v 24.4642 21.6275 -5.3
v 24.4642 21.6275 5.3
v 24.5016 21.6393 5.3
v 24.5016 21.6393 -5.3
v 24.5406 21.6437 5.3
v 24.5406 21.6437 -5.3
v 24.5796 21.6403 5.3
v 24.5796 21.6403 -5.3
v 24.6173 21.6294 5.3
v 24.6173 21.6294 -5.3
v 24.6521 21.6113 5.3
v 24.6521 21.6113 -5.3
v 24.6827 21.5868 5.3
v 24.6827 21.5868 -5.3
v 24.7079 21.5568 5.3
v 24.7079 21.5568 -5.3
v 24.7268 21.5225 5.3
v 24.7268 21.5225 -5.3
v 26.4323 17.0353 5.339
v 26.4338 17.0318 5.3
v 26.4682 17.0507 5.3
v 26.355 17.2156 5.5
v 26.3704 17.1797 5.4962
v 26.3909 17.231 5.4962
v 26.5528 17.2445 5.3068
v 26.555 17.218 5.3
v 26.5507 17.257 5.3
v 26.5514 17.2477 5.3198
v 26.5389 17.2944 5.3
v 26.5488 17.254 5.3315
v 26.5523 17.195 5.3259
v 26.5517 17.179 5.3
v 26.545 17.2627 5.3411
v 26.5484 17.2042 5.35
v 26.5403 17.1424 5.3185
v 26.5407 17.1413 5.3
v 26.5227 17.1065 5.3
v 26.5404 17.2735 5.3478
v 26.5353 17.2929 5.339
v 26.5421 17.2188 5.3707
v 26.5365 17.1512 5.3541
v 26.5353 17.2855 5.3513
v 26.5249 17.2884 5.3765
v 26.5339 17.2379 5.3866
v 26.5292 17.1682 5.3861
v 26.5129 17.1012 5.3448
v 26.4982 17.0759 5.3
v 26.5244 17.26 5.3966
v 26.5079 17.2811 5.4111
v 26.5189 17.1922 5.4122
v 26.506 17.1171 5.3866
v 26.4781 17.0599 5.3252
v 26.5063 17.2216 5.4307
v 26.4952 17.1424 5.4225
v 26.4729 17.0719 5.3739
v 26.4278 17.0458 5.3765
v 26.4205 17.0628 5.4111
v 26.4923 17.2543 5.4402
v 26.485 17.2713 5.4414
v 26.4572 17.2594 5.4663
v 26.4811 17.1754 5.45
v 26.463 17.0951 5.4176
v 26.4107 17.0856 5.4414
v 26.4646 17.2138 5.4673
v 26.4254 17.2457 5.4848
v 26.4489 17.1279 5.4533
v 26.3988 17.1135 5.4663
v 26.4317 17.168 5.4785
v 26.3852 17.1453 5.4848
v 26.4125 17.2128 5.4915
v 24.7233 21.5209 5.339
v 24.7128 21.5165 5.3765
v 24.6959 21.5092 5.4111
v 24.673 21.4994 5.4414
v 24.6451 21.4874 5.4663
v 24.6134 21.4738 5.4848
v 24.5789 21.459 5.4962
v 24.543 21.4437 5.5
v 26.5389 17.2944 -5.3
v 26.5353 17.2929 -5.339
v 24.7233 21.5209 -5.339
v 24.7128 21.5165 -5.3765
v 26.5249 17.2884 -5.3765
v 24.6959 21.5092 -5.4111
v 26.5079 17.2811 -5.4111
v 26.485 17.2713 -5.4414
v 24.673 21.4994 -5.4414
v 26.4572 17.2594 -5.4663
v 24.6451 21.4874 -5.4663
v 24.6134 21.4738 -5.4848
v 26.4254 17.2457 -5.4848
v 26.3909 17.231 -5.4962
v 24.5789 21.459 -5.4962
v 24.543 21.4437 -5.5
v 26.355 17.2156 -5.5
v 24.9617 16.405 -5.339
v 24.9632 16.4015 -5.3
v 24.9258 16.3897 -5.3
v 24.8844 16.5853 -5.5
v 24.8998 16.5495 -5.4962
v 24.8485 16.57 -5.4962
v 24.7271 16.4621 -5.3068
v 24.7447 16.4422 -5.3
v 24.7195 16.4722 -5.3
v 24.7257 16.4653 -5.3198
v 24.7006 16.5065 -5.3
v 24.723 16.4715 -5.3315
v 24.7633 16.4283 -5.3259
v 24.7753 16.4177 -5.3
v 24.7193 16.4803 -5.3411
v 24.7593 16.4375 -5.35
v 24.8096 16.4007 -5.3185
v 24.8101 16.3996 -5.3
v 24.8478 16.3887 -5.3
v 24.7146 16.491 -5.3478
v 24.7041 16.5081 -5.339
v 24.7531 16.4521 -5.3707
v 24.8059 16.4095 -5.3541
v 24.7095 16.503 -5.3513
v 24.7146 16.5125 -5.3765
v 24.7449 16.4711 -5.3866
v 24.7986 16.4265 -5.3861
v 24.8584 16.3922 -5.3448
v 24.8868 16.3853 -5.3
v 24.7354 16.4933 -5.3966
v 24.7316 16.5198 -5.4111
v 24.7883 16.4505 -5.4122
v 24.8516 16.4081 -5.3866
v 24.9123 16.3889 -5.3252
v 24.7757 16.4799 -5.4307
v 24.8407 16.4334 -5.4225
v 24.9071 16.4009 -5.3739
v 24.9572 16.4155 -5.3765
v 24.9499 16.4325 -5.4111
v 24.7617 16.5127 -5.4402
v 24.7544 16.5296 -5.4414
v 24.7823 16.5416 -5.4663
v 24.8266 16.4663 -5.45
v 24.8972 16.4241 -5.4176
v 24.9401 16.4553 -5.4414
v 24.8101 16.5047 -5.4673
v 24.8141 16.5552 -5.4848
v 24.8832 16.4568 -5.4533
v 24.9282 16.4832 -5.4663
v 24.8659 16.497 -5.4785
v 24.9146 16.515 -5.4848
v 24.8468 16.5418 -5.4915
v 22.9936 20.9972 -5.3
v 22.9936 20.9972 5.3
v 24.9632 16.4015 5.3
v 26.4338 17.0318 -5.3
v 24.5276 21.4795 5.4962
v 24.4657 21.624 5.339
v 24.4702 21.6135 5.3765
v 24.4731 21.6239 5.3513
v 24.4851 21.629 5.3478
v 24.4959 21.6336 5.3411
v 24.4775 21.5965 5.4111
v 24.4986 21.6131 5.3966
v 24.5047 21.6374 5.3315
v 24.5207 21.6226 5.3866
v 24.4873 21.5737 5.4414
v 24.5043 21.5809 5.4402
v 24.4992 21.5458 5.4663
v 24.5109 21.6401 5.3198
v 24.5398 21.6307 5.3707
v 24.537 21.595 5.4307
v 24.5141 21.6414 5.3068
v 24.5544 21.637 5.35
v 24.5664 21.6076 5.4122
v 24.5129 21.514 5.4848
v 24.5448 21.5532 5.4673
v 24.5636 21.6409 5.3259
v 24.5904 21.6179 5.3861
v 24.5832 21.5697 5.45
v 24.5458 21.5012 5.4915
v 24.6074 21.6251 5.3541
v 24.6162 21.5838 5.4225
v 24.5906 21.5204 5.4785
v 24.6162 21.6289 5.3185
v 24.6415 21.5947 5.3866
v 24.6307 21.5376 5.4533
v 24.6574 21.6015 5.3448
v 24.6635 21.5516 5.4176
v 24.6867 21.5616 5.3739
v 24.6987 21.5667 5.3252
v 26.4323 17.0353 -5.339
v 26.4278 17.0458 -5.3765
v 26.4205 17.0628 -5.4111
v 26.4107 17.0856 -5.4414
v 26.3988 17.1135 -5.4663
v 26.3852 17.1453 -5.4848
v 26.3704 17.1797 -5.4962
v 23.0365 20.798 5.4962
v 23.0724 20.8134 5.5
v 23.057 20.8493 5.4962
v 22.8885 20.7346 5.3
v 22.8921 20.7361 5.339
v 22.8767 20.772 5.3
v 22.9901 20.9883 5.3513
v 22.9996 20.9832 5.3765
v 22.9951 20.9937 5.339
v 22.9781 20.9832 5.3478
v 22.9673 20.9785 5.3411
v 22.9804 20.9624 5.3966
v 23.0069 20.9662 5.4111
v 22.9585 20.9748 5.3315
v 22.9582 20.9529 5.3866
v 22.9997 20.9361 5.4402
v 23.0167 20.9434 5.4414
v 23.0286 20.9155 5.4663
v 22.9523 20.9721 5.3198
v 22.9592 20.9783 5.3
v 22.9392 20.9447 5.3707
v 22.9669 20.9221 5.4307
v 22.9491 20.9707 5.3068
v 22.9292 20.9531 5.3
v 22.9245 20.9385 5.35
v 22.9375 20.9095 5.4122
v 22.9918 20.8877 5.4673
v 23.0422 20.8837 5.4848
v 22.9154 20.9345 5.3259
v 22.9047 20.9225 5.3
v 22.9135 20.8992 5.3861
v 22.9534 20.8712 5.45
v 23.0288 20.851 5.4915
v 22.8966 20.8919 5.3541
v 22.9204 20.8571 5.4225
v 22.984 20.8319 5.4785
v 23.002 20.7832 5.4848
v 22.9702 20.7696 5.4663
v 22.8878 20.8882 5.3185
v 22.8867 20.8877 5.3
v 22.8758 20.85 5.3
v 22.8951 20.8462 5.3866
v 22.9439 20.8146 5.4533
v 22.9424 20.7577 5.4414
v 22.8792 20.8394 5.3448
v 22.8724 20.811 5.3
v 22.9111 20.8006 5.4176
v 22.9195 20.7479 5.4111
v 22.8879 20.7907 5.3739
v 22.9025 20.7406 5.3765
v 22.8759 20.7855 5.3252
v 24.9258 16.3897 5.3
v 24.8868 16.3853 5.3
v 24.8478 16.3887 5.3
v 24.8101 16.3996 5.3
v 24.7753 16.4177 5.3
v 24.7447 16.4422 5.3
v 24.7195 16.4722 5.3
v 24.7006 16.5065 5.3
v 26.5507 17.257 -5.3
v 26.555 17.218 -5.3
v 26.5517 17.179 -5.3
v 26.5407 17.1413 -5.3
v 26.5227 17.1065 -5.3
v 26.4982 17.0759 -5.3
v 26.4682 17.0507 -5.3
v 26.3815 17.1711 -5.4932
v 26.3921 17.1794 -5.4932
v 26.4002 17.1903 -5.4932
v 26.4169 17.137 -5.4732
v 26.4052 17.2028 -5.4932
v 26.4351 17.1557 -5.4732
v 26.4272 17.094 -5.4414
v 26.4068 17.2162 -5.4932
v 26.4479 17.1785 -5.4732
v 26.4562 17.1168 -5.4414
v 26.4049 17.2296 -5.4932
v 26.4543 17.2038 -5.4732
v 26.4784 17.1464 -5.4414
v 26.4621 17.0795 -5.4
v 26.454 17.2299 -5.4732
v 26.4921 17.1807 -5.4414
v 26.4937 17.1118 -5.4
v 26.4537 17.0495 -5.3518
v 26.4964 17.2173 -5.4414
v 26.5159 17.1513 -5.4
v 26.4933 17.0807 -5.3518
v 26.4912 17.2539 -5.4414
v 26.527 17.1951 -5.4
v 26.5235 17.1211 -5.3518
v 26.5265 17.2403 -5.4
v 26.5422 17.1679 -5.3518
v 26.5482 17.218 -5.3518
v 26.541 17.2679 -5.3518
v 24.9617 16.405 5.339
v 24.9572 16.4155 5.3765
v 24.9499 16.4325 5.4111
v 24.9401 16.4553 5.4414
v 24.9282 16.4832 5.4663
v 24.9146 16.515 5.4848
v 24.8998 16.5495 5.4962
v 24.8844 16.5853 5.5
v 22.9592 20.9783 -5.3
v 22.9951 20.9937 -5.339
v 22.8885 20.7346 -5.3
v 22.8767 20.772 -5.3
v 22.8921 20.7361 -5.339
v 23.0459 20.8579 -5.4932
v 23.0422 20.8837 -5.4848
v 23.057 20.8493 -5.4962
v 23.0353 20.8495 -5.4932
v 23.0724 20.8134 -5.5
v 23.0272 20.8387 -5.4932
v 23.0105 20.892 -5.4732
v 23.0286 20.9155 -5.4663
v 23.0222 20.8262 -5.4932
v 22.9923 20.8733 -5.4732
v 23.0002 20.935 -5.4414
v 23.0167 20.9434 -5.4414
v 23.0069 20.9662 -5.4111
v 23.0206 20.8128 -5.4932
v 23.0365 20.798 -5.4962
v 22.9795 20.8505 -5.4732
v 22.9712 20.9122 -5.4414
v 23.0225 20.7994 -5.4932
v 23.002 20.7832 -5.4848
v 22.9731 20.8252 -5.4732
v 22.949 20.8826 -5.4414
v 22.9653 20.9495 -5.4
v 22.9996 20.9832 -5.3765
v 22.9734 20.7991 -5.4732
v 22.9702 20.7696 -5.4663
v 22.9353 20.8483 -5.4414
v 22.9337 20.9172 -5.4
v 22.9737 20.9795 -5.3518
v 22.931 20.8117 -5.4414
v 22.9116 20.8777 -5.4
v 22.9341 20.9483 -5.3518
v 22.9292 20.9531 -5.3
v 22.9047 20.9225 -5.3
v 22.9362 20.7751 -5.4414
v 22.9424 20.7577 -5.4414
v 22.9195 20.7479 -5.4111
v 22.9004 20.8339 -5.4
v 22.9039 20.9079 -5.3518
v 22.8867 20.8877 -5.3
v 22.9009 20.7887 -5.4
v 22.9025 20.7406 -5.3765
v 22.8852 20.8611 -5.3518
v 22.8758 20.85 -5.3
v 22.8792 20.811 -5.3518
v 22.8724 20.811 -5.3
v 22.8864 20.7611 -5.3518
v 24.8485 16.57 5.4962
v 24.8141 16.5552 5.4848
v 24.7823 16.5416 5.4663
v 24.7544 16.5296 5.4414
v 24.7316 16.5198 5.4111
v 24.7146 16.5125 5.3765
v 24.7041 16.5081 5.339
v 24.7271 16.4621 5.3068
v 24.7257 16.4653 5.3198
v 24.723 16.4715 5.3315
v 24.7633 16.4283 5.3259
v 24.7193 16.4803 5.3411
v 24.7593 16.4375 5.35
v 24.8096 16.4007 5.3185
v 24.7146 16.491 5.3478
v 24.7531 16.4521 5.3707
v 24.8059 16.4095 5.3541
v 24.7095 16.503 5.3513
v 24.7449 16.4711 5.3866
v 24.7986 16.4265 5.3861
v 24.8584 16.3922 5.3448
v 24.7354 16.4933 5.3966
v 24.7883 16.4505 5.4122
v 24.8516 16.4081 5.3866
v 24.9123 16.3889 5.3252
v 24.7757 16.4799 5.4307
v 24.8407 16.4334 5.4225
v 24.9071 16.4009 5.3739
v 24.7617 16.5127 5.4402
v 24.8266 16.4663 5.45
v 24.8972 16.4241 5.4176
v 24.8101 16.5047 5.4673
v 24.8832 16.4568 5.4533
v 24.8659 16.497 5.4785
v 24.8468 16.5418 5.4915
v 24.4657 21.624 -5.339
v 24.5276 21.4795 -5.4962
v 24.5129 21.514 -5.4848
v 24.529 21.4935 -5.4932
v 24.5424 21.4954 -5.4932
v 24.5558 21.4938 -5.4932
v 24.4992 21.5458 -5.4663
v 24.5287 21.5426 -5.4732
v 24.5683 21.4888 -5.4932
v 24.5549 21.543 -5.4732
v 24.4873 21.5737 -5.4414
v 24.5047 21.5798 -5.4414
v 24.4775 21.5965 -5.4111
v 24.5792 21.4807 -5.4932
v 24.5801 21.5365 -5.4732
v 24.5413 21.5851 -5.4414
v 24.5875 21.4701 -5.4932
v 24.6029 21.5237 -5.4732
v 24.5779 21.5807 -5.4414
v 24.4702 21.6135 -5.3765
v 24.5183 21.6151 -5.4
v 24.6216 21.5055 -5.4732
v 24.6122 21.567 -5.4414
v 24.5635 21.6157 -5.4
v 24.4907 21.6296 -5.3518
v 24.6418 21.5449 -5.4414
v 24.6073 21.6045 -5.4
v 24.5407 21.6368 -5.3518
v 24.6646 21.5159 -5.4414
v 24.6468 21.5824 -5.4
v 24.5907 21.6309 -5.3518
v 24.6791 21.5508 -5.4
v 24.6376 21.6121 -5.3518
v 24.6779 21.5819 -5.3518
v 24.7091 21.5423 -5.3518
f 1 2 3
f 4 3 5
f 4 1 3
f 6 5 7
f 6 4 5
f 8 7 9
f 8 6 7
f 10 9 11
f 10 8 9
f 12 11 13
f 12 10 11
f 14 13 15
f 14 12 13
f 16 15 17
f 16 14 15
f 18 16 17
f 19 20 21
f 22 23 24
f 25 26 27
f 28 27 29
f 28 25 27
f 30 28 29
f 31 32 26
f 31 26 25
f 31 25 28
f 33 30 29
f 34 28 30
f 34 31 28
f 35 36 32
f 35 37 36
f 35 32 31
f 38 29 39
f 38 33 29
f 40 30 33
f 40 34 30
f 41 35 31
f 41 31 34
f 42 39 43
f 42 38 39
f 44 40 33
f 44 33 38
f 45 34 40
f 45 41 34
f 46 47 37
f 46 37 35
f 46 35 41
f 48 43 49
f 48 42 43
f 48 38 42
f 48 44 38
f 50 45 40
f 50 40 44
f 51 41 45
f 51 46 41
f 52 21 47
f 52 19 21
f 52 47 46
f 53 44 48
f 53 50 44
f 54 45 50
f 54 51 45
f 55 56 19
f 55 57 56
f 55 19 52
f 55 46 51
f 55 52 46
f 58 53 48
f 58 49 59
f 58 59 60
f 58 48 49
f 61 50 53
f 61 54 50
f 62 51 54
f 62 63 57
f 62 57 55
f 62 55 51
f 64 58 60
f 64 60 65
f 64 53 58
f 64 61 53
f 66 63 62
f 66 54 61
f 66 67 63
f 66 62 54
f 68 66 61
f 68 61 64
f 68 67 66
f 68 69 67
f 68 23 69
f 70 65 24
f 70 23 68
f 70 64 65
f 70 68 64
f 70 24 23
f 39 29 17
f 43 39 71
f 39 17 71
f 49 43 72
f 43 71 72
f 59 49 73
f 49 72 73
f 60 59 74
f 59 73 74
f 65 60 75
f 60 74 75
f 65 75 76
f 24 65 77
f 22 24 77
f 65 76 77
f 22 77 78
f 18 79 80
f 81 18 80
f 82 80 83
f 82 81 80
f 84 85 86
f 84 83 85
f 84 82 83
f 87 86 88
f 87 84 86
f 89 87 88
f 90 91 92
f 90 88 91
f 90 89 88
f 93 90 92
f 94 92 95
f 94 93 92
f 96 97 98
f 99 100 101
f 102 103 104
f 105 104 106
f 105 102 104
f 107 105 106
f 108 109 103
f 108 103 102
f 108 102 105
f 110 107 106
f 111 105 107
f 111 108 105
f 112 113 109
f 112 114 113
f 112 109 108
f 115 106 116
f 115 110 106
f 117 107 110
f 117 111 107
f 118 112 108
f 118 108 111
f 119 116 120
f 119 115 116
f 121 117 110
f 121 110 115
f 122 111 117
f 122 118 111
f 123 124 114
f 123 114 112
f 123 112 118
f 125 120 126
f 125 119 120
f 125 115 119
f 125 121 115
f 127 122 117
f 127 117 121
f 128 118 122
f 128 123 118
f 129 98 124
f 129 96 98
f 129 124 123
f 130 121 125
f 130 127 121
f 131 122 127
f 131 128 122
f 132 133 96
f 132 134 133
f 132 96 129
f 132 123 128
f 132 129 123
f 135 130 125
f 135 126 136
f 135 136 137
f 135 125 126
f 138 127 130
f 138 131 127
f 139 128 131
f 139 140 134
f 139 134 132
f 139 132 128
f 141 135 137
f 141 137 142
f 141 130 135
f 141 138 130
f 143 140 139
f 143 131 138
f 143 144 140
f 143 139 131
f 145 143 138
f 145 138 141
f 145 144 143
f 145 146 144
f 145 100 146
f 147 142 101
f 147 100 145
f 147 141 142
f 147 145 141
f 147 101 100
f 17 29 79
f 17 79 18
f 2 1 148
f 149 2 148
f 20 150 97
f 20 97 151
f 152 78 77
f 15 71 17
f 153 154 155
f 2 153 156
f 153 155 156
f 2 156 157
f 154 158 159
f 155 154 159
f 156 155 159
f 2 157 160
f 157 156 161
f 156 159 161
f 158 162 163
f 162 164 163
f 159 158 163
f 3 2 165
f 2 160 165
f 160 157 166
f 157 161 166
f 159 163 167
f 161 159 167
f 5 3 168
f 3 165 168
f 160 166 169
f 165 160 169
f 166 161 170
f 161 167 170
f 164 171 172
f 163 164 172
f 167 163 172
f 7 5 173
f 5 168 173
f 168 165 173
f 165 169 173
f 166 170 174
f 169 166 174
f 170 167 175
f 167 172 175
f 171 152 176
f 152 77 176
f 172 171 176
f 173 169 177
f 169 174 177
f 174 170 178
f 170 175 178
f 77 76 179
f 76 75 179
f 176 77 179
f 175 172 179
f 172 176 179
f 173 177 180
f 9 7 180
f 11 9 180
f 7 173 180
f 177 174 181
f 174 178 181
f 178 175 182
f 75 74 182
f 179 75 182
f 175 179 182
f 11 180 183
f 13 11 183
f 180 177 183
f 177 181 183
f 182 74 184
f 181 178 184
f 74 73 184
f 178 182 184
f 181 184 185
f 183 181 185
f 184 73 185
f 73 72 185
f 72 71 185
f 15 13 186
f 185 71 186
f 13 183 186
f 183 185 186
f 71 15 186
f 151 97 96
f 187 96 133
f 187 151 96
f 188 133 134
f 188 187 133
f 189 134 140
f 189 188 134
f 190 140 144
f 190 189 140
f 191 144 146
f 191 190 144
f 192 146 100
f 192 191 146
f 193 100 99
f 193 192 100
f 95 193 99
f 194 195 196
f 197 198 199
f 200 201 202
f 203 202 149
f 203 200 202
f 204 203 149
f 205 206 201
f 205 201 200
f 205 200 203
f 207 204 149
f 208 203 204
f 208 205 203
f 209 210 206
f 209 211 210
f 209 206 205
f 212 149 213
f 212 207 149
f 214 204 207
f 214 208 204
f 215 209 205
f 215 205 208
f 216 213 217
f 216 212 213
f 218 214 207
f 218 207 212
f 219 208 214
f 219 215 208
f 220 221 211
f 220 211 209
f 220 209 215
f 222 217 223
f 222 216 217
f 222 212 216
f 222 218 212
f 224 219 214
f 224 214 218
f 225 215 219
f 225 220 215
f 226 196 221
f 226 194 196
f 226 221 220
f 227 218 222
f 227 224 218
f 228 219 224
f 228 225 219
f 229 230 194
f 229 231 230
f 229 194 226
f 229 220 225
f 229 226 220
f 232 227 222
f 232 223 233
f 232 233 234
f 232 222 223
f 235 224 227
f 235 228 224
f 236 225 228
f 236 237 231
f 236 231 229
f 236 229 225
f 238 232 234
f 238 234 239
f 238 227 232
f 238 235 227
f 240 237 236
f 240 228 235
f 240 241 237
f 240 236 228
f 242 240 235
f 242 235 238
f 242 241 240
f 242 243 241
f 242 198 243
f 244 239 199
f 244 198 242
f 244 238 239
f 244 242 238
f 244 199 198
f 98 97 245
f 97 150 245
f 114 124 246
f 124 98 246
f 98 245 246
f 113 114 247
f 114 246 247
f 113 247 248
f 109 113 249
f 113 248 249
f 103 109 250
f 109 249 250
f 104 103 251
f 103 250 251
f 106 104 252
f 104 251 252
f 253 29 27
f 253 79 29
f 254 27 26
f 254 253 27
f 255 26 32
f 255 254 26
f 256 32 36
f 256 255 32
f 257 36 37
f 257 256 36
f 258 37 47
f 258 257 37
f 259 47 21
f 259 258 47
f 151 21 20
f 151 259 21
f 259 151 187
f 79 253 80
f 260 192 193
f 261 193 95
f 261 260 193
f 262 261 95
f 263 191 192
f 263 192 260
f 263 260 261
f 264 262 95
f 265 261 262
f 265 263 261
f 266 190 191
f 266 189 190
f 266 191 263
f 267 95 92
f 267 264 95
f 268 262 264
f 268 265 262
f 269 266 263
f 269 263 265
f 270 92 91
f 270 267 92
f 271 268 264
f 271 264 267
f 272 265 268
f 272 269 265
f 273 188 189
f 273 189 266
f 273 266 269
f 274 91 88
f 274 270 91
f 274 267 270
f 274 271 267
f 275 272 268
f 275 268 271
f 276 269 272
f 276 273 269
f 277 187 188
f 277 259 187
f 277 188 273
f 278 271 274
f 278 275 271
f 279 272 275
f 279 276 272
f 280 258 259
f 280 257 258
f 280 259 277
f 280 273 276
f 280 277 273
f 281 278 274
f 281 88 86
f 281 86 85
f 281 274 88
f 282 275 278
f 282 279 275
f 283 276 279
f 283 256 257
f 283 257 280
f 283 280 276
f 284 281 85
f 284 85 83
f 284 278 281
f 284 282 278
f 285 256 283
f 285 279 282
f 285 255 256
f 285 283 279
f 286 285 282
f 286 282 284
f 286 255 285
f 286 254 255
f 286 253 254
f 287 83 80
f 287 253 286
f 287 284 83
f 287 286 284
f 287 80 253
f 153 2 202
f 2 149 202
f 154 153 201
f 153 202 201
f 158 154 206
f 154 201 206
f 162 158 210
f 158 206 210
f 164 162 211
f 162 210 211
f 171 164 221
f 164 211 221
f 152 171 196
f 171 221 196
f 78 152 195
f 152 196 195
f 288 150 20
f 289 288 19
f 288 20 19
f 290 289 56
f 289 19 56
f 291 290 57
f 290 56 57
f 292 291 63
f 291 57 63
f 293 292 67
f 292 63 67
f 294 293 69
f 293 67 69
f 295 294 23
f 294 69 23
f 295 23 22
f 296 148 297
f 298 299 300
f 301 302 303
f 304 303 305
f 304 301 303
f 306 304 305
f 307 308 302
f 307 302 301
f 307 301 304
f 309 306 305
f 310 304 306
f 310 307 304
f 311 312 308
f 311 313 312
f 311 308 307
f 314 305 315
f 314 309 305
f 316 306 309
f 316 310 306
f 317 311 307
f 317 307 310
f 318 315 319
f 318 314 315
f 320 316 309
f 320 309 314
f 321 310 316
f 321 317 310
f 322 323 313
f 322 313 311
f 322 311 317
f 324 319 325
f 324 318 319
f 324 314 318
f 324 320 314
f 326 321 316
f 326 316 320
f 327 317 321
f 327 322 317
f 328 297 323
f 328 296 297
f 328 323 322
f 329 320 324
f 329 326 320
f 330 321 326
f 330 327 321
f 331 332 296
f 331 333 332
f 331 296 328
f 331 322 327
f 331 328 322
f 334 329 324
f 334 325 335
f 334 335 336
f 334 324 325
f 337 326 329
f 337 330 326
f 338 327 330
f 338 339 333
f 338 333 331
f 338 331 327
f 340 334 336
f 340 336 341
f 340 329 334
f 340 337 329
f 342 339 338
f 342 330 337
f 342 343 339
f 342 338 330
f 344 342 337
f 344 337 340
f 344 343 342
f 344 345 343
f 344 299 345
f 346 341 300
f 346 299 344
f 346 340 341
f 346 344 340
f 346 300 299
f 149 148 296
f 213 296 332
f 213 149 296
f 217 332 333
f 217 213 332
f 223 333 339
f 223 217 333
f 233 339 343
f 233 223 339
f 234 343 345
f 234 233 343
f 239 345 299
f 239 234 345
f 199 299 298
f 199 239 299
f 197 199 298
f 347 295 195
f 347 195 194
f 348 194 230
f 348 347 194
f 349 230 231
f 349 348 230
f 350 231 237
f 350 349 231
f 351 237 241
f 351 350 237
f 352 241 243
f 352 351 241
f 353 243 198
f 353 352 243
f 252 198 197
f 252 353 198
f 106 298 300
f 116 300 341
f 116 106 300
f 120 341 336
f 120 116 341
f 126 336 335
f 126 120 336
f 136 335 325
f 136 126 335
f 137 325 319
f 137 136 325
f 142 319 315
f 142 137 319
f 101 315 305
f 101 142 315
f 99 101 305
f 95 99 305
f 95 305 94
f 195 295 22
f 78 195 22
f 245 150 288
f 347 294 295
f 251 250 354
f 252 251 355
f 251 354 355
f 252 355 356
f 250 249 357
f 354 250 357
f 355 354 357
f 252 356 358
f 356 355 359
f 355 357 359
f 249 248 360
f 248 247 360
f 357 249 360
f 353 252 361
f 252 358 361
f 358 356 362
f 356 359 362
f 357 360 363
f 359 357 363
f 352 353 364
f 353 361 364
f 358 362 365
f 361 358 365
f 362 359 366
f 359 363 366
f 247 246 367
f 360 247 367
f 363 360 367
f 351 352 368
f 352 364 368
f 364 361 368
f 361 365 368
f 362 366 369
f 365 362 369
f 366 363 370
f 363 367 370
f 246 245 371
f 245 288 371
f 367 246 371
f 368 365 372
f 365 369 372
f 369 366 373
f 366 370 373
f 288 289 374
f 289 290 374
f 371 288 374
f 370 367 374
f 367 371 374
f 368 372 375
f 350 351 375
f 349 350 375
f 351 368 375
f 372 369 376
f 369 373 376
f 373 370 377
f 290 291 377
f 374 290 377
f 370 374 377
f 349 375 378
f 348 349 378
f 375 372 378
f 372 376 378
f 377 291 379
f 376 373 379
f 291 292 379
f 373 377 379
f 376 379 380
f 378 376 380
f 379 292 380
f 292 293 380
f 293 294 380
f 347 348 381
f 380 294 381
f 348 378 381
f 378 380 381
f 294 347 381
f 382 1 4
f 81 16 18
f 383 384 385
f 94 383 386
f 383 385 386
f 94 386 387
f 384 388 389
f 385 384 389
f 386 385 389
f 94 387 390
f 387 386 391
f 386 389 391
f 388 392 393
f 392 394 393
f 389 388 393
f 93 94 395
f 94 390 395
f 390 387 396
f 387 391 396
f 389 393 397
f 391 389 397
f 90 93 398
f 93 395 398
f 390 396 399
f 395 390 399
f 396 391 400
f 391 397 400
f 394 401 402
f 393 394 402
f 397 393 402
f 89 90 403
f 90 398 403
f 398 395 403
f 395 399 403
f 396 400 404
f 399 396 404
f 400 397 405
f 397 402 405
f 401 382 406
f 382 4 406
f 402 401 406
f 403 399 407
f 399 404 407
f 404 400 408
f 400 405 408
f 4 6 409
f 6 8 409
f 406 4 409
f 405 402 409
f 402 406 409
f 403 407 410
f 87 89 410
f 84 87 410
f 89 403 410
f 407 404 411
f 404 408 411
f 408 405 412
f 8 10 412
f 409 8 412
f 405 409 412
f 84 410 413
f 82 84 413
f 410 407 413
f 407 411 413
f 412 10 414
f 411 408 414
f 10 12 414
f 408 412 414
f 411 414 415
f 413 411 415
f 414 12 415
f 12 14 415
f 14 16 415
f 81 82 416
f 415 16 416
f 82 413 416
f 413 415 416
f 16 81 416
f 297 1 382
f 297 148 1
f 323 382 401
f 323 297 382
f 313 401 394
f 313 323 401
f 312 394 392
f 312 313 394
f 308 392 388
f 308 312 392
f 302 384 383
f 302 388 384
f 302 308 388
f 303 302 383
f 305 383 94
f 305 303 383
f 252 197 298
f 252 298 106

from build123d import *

# Parameters (mm, degrees)
F2_DEPTH = 5.5
F4_R     = 0.2


with BuildPart() as f2:
    # F1 (on Top) → F2 (new body)
    with BuildSketch(Plane.XY):
        Polygon((24.6480524192, 21.7062796455), (22.8097623591, 20.9184410483), (24.779358852, 16.3227158982), (26.617648912, 17.1105544954), align=None)
    extrude(amount=F2_DEPTH)

    # F3: F2 across plane


with BuildPart() as f2_1:
    add(f2.part)
    add(f2.part.mirror(Plane.XY))

    # F4
    f4_edges = [f2_1.edges().sort_by_distance(p)[0] for p in [
        (25.698504, 16.716635, 5.5),
        (26.617649, 17.110554, 0),
        (25.698504, 16.716635, -5.5),
        (24.779359, 16.322716, 0),
        (23.794561, 18.620578, 5.5),
        (25.632851, 19.408417, 5.5),
        (23.728907, 21.31236, 5.5),
        (24.648052, 21.70628, 0),
        (22.809762, 20.918441, 0),
        (23.728907, 21.31236, -5.5),
        (23.794561, 18.620578, -5.5),
        (25.632851, 19.408417, -5.5),
    ]]
    fillet(f4_edges, radius=F4_R)


solid = f2_1.part
